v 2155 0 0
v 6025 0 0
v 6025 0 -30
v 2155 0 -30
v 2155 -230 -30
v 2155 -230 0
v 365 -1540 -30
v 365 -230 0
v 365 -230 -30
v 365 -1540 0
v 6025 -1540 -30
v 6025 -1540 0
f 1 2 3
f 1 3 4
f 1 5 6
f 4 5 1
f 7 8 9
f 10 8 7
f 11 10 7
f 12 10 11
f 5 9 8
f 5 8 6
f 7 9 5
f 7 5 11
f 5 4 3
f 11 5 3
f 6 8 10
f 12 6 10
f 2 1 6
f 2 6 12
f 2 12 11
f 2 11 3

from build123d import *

# Parameters (mm, degrees)
TABAN_FLAN_1_DEPTH         = 30
KES_EKSTR_ZYON1_DEPTH      = 6219.771984886
KES_EKSTR_ZYON1_DEPTH_BACK = 6219.771984886
IZIM2_W                    = 365
IZIM2_H                    = 658
KES_EKSTR_ZYON2_DEPTH      = 6219.771984886
KES_EKSTR_ZYON2_DEPTH_BACK = 6219.771984886
IZIM3_W                    = 365
IZIM3_H                    = 127


# Sheet-metal steps are written as plain solids
with BuildPart() as part:
    # Çizim1 → Taban-Flanş1 (new body)
    with BuildSketch(Plane.XY):
        Polygon((0, 0), (0, -1015), (365, -1015), (365, -1540), (6025, -1540), (6025, 0), align=None)
    extrude(amount=-TABAN_FLAN_1_DEPTH)

    # Çizim2 → Kes-Ekstrüzyon1 (cut, two sides: drawn at the far end of the back side and taken through both)
    with BuildSketch(Plane.XY.offset(-KES_EKSTR_ZYON1_DEPTH_BACK)):
        with Locations((182.5, -686)):
            Rectangle(IZIM2_W, IZIM2_H)
    extrude(amount=KES_EKSTR_ZYON1_DEPTH + KES_EKSTR_ZYON1_DEPTH_BACK, mode=Mode.SUBTRACT)

    # Çizim3 → Kes-Ekstrüzyon2 (cut, two sides: drawn at the far end of the back side and taken through both)
    with BuildSketch(Plane.XY.offset(-KES_EKSTR_ZYON2_DEPTH_BACK)):
        with Locations((182.5, -293.5)):
            Rectangle(IZIM3_W, IZIM3_H)
        Polygon((2155, 0), (0, 0), (0, -230), (365, -230), (2155, -230), align=None)
    extrude(amount=KES_EKSTR_ZYON2_DEPTH + KES_EKSTR_ZYON2_DEPTH_BACK, mode=Mode.SUBTRACT)


solid = part.part
